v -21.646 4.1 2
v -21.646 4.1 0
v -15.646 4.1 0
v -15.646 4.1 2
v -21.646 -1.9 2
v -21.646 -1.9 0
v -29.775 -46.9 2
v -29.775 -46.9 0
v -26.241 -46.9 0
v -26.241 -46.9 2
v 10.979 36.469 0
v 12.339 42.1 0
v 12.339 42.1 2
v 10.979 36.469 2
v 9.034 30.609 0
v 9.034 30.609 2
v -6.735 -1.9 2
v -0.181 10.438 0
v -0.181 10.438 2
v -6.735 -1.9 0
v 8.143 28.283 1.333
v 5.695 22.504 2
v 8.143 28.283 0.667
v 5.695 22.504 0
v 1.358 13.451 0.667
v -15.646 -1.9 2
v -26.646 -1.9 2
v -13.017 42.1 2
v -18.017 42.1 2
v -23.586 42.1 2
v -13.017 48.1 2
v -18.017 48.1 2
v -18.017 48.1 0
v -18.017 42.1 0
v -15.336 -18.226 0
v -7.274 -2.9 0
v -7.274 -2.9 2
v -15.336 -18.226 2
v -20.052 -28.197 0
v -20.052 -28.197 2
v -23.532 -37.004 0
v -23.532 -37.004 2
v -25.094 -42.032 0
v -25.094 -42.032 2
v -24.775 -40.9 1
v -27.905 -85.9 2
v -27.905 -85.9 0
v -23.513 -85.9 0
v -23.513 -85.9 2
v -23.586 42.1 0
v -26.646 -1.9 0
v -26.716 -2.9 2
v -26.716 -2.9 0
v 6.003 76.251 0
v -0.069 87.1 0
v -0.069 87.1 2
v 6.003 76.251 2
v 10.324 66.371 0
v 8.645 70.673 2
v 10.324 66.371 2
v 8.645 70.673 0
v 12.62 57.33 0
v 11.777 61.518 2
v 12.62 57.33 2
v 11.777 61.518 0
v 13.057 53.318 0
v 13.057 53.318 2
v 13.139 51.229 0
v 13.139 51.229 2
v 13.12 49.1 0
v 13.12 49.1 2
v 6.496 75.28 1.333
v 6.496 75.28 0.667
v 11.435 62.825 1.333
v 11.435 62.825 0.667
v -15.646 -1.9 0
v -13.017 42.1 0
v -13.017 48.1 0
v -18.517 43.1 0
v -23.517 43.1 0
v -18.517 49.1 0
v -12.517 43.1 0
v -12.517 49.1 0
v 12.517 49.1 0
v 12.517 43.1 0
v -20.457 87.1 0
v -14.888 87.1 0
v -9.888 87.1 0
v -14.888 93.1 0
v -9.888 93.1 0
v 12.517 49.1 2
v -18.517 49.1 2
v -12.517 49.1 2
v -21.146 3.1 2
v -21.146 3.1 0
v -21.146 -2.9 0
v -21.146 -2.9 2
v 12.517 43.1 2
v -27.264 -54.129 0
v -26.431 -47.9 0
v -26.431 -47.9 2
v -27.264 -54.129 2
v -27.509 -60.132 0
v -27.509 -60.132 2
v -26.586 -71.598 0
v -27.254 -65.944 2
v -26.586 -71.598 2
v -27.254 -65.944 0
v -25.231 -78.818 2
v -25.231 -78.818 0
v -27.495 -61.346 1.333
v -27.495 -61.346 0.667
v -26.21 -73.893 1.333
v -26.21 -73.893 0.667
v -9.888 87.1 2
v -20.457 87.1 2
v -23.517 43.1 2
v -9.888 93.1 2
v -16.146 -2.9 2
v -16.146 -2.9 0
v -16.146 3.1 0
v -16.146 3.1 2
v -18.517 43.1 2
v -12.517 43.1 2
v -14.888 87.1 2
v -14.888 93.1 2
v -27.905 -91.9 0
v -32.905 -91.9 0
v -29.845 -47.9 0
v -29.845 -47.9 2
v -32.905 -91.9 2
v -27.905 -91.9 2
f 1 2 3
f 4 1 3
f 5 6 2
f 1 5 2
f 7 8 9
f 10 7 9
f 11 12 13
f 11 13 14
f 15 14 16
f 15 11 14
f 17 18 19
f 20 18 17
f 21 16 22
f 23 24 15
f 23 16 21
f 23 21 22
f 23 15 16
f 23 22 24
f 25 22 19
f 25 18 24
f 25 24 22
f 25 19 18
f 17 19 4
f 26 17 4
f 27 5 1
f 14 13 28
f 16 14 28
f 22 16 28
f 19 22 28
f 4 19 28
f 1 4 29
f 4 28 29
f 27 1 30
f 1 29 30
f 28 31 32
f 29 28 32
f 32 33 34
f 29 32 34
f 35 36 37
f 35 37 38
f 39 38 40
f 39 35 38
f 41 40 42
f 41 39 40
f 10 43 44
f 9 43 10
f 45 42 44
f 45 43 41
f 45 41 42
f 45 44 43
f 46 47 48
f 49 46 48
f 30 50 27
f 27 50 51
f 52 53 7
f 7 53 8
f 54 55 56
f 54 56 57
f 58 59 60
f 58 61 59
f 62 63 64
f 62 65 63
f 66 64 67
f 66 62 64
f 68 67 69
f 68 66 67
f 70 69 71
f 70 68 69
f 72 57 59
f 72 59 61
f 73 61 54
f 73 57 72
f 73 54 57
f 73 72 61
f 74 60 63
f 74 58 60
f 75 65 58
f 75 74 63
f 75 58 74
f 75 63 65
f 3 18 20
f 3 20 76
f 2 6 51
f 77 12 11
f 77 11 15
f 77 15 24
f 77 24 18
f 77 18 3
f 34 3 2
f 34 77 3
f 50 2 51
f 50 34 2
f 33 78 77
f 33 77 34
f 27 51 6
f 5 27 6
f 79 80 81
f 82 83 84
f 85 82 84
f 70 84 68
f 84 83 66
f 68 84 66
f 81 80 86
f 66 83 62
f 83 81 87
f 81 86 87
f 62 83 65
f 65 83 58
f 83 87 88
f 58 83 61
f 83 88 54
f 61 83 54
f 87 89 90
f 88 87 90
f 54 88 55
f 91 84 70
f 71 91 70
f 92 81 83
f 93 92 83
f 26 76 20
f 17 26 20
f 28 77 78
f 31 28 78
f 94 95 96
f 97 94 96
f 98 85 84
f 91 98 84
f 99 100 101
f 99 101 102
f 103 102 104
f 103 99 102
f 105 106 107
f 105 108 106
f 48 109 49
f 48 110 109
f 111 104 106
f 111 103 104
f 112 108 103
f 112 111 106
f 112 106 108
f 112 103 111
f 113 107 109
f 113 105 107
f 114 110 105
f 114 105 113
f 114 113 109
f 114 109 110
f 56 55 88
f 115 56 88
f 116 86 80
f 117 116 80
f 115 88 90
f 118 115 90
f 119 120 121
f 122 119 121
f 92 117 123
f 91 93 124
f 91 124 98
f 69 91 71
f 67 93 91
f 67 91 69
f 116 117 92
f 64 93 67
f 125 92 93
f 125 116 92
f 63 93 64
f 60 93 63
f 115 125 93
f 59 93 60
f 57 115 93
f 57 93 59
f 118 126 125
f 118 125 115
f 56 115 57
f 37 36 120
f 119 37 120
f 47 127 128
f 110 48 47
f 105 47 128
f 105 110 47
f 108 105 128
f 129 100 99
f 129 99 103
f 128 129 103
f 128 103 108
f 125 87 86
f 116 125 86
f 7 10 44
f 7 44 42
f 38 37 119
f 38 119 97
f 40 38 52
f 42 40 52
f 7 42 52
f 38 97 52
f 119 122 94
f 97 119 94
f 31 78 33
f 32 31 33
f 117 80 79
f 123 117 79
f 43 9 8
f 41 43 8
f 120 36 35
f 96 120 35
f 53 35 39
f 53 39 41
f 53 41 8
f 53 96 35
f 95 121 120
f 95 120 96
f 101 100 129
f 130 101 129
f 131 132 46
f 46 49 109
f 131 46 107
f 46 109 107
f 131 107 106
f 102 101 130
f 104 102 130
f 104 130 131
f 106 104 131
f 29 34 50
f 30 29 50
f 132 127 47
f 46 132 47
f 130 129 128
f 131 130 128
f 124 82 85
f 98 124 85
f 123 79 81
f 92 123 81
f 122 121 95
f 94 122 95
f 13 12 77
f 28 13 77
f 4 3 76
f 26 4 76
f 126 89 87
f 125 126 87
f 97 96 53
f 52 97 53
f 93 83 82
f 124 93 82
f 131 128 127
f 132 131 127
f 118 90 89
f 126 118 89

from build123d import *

# Parameters (mm, degrees)
F1_DEPTH = 2


with BuildPart() as f1:
    # F0 (on Top) → F1 (new body)
    with BuildSketch(Plane.XY):
        with BuildLine():
            Line((-20.4571957112, 87.1), (-23.5168766766, 43.1))
            Line((-23.5168766766, 43.1), (-18.5168766766, 43.1))
            Line((-18.5168766766, 43.1), (-18.5168766766, 49.1))
            Line((-18.5168766766, 49.1), (-12.5168766766, 49.1))
            Line((-12.5168766766, 49.1), (-12.5168766766, 43.1))
            Line((-12.5168766766, 43.1), (12.5168766766, 43.1))
            Line((12.5168766766, 43.1), (12.5168766766, 49.1))
            Line((12.5168766766, 49.1), (13.1200117893, 49.0999999996))
            add(Edge.make_bspline(
                [(-0.0691957112, 87.1), (6.7670600664, 75.385477326), (13.603315844, 63.6709546521), (13.1200117893, 49.0999999996)],
                knots=[0, 0, 0, 0, 0.2539558406, 0.2539558406, 0.2539558406, 0.2539558406], degree=3))
            Line((-0.0691957112, 87.1), (-9.8876575074, 87.1))
            Line((-9.8876575074, 87.1), (-9.8876575074, 93.1))
            Line((-9.8876575074, 93.1), (-14.8876575074, 93.1))
            Line((-14.8876575074, 93.1), (-14.8876575074, 87.1))
            Line((-14.8876575074, 87.1), (-20.4571957112, 87.1))
        make_face()
    extrude(amount=F1_DEPTH)


with BuildPart() as f1b:
    # F0 (on Top) → F1, piece 2 (new body)
    with BuildSketch(Plane.XY):
        with BuildLine():
            add(Edge.make_bspline(
                [(-26.4305470242, -47.9), (-28.9813165577, -61.9153804796), (-26.6038291609, -74.0441530198), (-23.513396984, -85.9)],
                knots=[0.7330193554, 0.7330193554, 0.7330193554, 0.7330193554, 0.9613773268, 0.9613773268, 0.9613773268, 0.9613773268], degree=3))
            Line((-26.4305470242, -47.9), (-29.8448532186, -47.9))
            Line((-29.8448532186, -47.9), (-32.904534184, -91.9))
            Line((-32.904534184, -91.9), (-27.904534184, -91.9))
            Line((-27.904534184, -91.9), (-27.904534184, -85.9))
            Line((-27.904534184, -85.9), (-23.513396984, -85.9))
        make_face()
    extrude(amount=F1_DEPTH)


with BuildPart() as f1c:
    # F0 (on Top) → F1, piece 3 (new body)
    with BuildSketch(Plane.XY):
        with BuildLine():
            add(Edge.make_bspline(
                [(-7.2735192987, -2.9), (-14.3461911795, -16.0313284972), (-22.5779302826, -31.4336846167), (-25.8532730678, -44.9386606326), (-26.2407663034, -46.9)],
                knots=[0.5130445245, 0.5130445245, 0.5130445245, 0.5130445245, 0.6958534771, 0.7276056207, 0.7276056207, 0.7276056207, 0.7276056207], degree=3))
            Line((-7.2735192987, -2.9), (-16.1460958457, -2.9))
            Line((-16.1460958457, -2.9), (-16.1460958457, 3.1))
            Line((-16.1460958457, 3.1), (-21.1460958457, 3.1))
            Line((-21.1460958457, 3.1), (-21.1460958457, -2.9))
            Line((-21.1460958457, -2.9), (-26.7156340495, -2.9))
            Line((-26.7156340495, -2.9), (-29.7753150149, -46.9))
            Line((-29.7753150149, -46.9), (-26.2407663034, -46.9))
        make_face()
    extrude(amount=F1_DEPTH)


with BuildPart() as f1d:
    # F0 (on Top) → F1, piece 4 (new body)
    with BuildSketch(Plane.XY):
        with BuildLine():
            add(Edge.make_bspline(
                [(12.3391092449, 42.1), (9.8637373658, 28.9555074487), (1.5856940975, 13.5460464111), (-6.7348489575, -1.9)],
                knots=[0.2933629272, 0.2933629272, 0.2933629272, 0.2933629272, 0.5084039656, 0.5084039656, 0.5084039656, 0.5084039656], degree=3))
            Line((12.3391092449, 42.1), (-13.0168766766, 42.1))
            Line((-13.0168766766, 42.1), (-13.0168766766, 48.1))
            Line((-13.0168766766, 48.1), (-18.0168766766, 48.1))
            Line((-18.0168766766, 48.1), (-18.0168766766, 42.1))
            Line((-18.0168766766, 42.1), (-23.5864148803, 42.1))
            Line((-23.5864148803, 42.1), (-26.6460958457, -1.9))
            Line((-26.6460958457, -1.9), (-21.6460958457, -1.9))
            Line((-21.6460958457, -1.9), (-21.6460958457, 4.1))
            Line((-21.6460958457, 4.1), (-15.6460958457, 4.1))
            Line((-15.6460958457, 4.1), (-15.6460958457, -1.9))
            Line((-15.6460958457, -1.9), (-6.7348489575, -1.9))
        make_face()
    extrude(amount=F1_DEPTH)


solid = Compound([f1.part, f1b.part, f1c.part, f1d.part])
